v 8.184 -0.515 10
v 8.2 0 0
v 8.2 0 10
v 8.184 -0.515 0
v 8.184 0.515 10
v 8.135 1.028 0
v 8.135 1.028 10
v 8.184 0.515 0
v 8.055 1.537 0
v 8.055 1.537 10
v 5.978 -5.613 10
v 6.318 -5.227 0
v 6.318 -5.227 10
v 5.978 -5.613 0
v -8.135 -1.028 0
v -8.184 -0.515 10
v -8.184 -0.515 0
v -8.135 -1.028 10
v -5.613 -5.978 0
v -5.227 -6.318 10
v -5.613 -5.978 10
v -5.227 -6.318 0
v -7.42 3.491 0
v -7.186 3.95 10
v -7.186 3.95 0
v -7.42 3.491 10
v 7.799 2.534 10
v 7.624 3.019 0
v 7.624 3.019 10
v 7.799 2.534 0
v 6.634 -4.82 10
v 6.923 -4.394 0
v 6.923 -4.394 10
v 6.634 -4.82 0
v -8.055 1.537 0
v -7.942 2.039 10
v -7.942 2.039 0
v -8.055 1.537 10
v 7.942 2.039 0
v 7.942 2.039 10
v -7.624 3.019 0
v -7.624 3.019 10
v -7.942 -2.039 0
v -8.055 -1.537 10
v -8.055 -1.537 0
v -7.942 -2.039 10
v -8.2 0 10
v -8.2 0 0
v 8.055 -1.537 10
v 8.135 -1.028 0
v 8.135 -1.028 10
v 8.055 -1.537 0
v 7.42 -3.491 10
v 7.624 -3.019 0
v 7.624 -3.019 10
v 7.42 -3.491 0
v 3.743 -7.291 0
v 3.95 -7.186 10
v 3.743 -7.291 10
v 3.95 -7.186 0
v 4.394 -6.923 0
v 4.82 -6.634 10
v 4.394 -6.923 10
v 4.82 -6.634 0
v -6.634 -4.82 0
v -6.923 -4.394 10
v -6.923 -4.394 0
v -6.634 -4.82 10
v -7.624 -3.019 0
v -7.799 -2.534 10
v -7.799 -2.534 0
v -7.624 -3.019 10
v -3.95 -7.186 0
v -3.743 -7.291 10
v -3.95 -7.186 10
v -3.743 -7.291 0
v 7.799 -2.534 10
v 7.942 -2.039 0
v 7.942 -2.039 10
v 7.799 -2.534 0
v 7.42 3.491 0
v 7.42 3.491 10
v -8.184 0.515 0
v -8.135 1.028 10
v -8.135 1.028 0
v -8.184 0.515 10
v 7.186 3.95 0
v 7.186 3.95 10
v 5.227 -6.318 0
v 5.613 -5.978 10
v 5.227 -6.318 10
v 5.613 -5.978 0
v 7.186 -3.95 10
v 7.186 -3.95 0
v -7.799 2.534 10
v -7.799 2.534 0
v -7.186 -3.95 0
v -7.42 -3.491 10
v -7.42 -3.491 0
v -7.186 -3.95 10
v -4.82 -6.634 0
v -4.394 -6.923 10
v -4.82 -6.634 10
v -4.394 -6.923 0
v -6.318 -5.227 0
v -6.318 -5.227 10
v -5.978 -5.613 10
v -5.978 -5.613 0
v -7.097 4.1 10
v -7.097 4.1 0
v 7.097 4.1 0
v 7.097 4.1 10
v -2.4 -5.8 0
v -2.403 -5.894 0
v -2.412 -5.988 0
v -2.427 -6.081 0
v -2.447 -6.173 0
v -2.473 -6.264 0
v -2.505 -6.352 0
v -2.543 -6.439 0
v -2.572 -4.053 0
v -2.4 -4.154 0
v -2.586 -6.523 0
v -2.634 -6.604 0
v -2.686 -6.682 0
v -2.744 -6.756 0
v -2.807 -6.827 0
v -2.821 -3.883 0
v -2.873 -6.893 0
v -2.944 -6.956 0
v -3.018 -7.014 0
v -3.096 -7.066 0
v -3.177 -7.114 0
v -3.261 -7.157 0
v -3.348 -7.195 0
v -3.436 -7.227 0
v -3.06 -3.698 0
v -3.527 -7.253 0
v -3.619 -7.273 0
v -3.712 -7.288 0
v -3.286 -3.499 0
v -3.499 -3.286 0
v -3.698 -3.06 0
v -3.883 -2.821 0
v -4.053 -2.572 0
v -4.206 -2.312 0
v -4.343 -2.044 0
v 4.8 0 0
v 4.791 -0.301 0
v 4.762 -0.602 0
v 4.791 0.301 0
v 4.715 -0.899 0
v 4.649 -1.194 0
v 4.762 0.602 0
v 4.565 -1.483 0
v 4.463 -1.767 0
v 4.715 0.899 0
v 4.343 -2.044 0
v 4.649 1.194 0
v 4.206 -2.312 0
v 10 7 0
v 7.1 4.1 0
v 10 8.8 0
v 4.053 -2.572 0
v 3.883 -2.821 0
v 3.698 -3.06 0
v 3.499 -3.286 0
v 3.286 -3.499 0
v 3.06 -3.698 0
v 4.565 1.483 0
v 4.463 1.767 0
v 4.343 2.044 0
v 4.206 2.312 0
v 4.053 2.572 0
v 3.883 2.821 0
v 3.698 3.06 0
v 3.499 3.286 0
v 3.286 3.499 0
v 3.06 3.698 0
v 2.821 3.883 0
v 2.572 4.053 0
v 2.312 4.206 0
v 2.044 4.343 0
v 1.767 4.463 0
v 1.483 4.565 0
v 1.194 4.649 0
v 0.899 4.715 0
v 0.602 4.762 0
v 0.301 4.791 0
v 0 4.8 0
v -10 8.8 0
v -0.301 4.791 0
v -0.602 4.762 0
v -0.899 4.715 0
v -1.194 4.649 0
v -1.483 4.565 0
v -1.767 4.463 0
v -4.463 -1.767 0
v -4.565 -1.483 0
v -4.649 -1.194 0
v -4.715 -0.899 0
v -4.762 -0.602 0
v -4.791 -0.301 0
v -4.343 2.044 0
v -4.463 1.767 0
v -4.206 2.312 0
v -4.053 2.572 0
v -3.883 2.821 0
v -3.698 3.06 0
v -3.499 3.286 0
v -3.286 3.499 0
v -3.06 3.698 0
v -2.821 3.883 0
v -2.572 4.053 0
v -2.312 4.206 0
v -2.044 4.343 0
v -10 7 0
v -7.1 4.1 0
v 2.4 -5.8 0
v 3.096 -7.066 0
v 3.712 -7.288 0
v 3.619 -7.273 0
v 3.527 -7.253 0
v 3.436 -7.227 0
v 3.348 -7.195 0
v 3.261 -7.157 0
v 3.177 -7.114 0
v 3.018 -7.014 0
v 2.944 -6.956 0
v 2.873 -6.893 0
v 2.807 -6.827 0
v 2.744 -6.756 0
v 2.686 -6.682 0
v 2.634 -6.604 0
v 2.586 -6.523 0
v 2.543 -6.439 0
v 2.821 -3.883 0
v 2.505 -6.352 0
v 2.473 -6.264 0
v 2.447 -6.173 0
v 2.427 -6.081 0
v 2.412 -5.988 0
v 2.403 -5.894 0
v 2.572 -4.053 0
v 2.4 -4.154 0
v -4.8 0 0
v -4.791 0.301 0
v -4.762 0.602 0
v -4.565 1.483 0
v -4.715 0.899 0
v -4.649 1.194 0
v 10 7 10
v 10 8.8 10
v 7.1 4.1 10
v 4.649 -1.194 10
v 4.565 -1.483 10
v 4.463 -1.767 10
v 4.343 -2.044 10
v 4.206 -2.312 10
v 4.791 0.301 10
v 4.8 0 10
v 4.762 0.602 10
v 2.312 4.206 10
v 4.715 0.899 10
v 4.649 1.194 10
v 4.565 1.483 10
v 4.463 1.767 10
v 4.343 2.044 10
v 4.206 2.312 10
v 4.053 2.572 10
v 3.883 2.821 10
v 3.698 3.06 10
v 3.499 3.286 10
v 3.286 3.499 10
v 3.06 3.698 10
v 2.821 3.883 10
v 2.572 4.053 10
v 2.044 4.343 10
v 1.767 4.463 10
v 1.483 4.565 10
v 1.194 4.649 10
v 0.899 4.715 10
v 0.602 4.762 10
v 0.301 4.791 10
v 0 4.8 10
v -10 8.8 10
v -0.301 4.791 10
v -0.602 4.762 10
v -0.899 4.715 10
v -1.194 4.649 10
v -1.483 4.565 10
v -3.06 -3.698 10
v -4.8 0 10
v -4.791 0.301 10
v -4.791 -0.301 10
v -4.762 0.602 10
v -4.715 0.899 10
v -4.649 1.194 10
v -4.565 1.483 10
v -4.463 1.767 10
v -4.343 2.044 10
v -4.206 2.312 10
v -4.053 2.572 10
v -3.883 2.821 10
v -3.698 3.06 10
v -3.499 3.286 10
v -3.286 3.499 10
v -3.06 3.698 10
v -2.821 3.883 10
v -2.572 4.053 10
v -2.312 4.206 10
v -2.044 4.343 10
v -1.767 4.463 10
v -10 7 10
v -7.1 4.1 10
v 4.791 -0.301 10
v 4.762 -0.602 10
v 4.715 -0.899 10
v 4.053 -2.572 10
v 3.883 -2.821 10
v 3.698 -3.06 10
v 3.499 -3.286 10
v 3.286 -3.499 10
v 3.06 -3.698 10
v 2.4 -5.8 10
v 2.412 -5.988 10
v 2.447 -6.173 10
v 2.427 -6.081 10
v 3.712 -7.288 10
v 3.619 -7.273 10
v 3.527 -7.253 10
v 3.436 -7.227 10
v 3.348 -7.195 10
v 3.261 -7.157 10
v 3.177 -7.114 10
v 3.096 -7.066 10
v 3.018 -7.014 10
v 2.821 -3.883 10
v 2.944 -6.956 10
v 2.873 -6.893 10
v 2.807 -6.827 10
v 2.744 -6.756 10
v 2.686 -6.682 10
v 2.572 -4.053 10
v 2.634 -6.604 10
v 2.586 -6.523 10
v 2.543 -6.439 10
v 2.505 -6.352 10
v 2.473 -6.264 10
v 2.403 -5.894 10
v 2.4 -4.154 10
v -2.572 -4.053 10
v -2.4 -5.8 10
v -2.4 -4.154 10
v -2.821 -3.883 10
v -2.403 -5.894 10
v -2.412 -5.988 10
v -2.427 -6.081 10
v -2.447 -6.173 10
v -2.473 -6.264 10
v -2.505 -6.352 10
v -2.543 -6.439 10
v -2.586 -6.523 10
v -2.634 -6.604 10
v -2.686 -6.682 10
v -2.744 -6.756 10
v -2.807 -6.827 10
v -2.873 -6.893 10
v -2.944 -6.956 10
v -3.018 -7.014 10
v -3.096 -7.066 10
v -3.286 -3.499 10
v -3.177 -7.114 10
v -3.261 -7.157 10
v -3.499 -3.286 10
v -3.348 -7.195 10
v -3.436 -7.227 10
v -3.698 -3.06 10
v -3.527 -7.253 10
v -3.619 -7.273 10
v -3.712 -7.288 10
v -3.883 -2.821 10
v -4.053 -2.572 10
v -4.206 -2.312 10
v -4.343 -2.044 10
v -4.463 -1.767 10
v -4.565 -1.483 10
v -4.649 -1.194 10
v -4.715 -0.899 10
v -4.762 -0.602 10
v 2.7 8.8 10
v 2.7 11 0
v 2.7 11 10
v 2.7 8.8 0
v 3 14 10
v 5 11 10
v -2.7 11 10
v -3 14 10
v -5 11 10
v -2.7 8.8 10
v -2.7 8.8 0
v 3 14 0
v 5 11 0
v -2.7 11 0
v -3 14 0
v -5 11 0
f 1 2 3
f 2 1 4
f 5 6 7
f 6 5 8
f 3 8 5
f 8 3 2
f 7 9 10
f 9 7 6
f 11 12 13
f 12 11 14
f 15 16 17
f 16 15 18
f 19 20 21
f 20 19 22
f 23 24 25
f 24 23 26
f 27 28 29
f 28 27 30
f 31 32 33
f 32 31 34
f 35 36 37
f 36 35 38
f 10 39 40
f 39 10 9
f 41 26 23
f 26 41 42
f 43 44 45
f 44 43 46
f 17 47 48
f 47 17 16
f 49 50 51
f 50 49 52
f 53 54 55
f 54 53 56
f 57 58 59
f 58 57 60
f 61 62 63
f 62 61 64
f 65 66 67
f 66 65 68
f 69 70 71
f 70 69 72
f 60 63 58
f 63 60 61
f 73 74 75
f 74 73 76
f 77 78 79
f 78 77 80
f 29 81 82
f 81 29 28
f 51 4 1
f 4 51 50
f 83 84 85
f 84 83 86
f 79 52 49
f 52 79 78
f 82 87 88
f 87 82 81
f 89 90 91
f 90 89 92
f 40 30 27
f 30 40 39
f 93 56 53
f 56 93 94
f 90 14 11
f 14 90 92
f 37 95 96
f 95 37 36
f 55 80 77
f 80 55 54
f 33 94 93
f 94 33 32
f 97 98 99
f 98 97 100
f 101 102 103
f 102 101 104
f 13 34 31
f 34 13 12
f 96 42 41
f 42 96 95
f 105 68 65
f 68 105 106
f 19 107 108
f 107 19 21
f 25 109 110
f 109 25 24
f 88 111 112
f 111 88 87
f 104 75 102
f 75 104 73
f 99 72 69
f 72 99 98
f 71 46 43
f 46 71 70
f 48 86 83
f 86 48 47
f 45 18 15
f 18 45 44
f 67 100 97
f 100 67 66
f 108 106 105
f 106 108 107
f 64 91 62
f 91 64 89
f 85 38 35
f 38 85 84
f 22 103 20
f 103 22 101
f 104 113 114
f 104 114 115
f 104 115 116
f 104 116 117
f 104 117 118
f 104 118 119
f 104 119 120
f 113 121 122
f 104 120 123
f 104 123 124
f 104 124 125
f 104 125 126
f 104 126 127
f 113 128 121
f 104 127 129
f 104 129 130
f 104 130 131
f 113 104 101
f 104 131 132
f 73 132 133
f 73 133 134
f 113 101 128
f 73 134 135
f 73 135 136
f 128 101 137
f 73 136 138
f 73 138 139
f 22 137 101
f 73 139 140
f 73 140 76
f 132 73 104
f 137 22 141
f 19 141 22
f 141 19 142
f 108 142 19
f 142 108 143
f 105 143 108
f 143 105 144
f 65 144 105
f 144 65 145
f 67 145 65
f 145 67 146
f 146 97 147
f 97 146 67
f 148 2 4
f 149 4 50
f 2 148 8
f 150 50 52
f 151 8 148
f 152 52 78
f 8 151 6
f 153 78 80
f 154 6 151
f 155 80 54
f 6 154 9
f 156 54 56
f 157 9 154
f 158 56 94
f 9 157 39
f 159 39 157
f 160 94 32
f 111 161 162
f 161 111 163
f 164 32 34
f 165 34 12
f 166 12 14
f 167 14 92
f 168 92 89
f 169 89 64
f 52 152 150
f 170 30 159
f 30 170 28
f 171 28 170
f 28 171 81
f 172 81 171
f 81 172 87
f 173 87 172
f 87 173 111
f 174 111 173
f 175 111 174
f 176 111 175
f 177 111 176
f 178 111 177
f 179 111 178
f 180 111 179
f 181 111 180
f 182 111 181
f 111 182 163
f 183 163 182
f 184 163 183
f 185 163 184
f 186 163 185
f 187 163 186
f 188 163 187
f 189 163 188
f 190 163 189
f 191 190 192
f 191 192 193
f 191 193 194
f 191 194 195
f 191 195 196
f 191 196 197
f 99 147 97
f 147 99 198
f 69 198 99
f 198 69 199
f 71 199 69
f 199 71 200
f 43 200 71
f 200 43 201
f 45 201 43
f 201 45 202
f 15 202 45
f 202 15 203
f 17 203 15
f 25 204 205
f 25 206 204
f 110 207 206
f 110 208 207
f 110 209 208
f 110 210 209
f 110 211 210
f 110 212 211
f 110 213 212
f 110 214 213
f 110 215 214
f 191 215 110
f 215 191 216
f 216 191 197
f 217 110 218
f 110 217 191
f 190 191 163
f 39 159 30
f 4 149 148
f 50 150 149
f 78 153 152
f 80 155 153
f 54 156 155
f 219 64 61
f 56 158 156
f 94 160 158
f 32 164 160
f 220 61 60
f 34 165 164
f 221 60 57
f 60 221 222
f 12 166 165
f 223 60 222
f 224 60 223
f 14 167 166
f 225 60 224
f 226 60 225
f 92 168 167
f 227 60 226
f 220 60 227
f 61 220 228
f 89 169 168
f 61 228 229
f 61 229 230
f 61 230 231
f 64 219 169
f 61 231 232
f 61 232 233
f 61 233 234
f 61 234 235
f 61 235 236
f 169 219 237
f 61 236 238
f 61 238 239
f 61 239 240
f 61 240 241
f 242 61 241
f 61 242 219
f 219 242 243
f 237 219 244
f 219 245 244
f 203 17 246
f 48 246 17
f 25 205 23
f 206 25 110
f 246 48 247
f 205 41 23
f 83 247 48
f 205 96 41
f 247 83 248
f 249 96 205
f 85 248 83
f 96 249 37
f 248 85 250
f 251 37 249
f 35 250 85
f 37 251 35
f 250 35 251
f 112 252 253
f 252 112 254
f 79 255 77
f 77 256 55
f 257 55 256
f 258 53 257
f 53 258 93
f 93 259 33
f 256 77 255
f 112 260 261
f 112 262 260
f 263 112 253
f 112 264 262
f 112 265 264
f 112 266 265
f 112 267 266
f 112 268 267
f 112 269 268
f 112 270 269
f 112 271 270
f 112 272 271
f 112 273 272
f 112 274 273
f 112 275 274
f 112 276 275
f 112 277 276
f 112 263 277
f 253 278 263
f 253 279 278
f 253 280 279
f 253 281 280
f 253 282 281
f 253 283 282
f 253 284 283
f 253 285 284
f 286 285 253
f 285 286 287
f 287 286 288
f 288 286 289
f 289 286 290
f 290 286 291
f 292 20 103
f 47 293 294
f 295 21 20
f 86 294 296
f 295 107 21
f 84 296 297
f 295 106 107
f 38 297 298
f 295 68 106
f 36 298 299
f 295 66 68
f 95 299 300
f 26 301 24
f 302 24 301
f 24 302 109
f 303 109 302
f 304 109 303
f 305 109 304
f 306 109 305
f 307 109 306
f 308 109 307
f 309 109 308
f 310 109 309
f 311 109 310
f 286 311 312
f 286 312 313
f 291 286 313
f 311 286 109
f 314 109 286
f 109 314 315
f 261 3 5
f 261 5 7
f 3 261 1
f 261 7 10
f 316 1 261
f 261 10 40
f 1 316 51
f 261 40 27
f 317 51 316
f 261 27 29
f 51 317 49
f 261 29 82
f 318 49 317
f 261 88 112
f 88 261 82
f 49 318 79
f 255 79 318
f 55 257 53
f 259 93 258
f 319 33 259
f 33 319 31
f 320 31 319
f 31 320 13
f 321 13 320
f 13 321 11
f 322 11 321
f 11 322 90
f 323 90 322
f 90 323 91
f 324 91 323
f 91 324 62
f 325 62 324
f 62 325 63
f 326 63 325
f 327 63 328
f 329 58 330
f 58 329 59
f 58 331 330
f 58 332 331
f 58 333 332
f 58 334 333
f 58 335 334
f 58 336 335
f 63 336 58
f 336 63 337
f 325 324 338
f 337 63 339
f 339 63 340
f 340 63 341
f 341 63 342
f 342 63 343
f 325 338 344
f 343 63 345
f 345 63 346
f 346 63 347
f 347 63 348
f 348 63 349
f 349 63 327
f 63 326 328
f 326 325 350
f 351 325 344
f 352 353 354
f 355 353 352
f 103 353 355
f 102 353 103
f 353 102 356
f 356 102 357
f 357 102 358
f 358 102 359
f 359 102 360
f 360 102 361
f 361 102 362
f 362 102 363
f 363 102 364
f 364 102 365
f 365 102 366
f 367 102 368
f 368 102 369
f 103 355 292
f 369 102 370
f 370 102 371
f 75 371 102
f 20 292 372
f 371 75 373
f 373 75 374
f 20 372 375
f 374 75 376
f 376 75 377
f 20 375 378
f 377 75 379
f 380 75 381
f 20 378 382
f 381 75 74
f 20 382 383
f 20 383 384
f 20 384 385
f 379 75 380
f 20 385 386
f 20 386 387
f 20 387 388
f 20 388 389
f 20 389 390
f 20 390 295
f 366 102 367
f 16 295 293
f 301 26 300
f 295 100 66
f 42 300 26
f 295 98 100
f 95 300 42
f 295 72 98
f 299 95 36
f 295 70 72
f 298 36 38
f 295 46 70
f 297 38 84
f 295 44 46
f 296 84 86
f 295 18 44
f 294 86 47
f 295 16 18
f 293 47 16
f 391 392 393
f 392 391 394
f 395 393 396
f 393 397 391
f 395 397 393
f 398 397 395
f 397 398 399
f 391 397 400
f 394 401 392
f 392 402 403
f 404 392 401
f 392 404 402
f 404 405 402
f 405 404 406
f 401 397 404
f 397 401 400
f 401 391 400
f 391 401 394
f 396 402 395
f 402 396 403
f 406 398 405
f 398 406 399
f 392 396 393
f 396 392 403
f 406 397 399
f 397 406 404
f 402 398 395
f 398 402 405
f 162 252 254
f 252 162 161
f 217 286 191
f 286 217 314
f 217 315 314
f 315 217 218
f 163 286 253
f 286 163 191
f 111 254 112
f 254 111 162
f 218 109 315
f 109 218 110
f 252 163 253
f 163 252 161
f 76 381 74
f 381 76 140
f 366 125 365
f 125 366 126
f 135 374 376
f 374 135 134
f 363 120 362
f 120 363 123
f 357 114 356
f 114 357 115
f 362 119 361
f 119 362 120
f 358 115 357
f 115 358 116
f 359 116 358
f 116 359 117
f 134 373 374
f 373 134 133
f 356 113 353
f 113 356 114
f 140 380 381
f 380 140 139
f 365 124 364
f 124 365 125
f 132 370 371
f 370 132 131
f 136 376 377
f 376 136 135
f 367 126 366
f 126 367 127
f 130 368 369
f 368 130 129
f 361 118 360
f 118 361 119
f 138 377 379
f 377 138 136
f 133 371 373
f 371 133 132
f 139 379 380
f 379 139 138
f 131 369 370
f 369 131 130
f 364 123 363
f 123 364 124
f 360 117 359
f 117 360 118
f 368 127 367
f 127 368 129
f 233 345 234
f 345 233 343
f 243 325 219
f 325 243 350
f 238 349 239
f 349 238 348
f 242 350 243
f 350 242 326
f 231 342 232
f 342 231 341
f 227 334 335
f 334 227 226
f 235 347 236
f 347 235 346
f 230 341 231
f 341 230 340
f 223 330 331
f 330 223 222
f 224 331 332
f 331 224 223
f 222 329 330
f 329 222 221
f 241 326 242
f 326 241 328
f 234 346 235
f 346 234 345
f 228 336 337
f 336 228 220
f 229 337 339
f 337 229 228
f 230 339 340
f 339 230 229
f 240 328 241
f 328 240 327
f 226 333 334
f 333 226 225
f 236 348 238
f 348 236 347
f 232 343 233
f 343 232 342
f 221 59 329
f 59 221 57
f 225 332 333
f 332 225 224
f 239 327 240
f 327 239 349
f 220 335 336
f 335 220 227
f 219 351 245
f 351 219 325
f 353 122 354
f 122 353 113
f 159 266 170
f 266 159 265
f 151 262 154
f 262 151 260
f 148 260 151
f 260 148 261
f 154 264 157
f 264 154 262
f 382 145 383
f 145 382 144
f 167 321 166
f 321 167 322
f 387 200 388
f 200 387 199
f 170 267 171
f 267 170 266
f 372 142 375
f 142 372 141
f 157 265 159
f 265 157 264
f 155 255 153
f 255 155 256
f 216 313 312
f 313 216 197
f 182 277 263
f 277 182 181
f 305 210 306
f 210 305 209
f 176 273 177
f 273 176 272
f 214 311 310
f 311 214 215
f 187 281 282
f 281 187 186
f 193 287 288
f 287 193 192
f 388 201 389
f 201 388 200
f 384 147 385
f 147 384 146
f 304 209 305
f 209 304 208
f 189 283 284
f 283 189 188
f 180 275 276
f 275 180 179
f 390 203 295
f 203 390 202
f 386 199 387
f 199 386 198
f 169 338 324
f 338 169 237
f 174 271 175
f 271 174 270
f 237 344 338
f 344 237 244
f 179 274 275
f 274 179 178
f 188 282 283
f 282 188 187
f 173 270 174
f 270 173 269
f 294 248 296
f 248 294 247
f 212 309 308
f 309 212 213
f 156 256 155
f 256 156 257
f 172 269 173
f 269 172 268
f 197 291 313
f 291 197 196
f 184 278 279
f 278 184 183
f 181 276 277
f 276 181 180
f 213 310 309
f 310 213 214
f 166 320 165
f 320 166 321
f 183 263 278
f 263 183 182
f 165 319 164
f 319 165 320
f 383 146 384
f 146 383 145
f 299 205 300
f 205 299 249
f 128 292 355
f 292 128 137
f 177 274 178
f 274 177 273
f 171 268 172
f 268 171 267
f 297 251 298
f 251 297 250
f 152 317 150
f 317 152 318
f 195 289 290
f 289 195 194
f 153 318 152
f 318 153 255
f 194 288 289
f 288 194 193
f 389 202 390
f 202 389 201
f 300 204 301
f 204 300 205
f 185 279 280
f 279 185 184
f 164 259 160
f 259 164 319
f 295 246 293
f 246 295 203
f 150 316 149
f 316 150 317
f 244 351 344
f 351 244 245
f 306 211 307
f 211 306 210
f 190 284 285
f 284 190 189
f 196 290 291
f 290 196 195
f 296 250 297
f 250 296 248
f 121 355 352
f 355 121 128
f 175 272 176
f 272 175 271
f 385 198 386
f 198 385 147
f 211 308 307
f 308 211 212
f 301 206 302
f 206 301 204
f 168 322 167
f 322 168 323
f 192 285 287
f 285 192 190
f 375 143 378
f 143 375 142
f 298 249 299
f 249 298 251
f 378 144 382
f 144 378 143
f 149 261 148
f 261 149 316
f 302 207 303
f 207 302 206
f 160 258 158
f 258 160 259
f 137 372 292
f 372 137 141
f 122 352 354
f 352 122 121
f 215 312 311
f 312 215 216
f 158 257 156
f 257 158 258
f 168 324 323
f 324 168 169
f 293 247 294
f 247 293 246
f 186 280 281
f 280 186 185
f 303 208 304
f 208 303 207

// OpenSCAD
// file: functions.scad
/**********************************
	File: functions.scad
	Revision: 0.2 (2/3/2012)
	OpenSCAD version by:
	Michael Williams (gannon)
	mswillia@mtu.edu
**********************************/
include <config.scad>

//Drill a hole the given depth at the given location
module drill(x,y,radius,depth) {
	translate([x,y,-overdrill])
		cylinder(r=radius,h=depth,$fn=100);
}

module roundedcorner(radius,thickness,angle) {
	rotate([0,0,angle])
		translate([-radius+overdrill,-radius+overdrill,-overdrill])
			difference() {
				translate([-overdrill,-overdrill,0])
					cube([radius+overdrill,radius+overdrill,thickness+overdrill*2]);
				cylinder(r=radius,h=thickness+overdrill*2, $fn=100);
			}
}

module Lbracket(height,width,length,thickness) {
	difference() {
		cube([height+thickness,width+thickness,length]);
		translate([thickness,thickness,-overdrill])
			cube([width+thickness,height+thickness,length+overdrill*2]);
	}
}

//Usage: points is an array consisting of elements
//[x,y,r] for each point of the polygon
//Please note that x and y will be the centers
//of the rounded edges! Outside wall will be
//r away at some angle.
//Ideally I will make a function that will find
//the place to put the circle of a given radius
//based off of the points in the polygon.
module multiradiusroundedpoly(points,height) {
	linear_extrude(height=height)
		hull()
			for (p = points) {
				translate([p[0],p[1],0])
					circle(r=p[2],$fn=100);
			}
}

module bearing_block_holes() {
	make_4_holes(bearing_block_base[0]-11, bearing_block_base[1]-9, bearing_block_base[2],screw_b_diameter/2);
}

module make_4_holes(width,height,depth,radius) {
	translate([width/2, height/2,0])
		for (i=[-1,1],j=[-1,1]) {
			translate([i*width/2, j*height/2, 0])
				drill(0,0, radius, depth+overdrill*2);
		}
}

module x_axis_bearing_mount() {
	difference() {
		cube(bearing_mount_base);
		
		//Rounded corners
		for (i=[0,1],j=[0,1]) {
			translate([i*bearing_mount_base[0],j*bearing_mount_base[1],0])
				if (i==1 && j==1)
					roundedcorner(bearing_mount_corner,bearing_mount_base[2],0);
				else
					roundedcorner(bearing_mount_corner,bearing_mount_base[2],180+i*90-j*90);
		}
		

		//Middle cutout
		translate([(bearing_mount_base[0]-bearing_mount_hole[0])/2,(bearing_mount_base[1]-bearing_mount_hole[1])/2,-overdrill])
			cube(bearing_mount_hole);
			
		//Bearing mounts
		translate([bearing_mount_base[0]-bearing_block_base[0]+10.5+screw_b_diameter/2,bearing_block_base[0]-4.5+screw_b_diameter/2,0])
			rotate([0,0,-90])
				bearing_block_holes();

		translate([6,bearing_block_base[0]-4.5+screw_b_diameter/2,0])
			rotate([0,0,-90])
				bearing_block_holes();
		
		//Middle 4 holes
		translate([44.5,4,0])
			make_4_holes(bearing_mount_base[0]-89,bearing_mount_base[1]-8,bearing_mount_base[2],screw_b_diameter/2);

	}
}
// file: config.scad
/**********************************
	File: config.scad
	Revision: 0.3 (2/3/2013)
	OpenSCAD version by:
	Michael Williams (gannon)
	mswillia@mtu.edu
**********************************/

/**********************************
	GENERAL CONFIGURATION
**********************************/
//This is for the depth of holes so OpenSCAD renders correctly.
overdrill=0.1;

//LM10UU
linear_bearing_length=29;
linear_bearing_ID=10;
linear_bearing_OD=19.4;//19

//HFSB5-2020 extrusions
extrusion_height=20;
extrusion_width=20;
extrusion_wall=3.2;
extrusion_opening=5.4;

//Large rods
smooth_rod_diameter=10;
threaded_rod_diameter=8;

//608zz
skate_bearings_length=7;
skate_bearings_ID=8;
skate_bearings_OD=22;

//Belt configuration
belt_width=8;
belt_depth=1;

/*
3/8"-12 acme rod
m8 threaded rod
*/

spring_OD=6;

screw_a_diameter=3;
screw_b_diameter=4;
screw_c_diameter=5;
screw_d_diameter=8;

/**********************************
	AUTO CONFIGURATION
**********************************/

//Bearing block
bearing_block_base = [linear_bearing_OD*2+5,linear_bearing_length+5,7];

//X Axis
bearing_mount_corner = 6;
bearing_mount_base = [114,bearing_block_base[0]+3.7,6];
bearing_mount_hole = [bearing_mount_base[0]-12,bearing_mount_base[1]-27.5,bearing_mount_base[2]+overdrill*2];

/**********************************
	END CONFIGURATION
**********************************/
// main file
/**********************************
	File: CableHolder.scad
	Revision: 0.4 (2/2/2013)
	OpenSCAD version by:
	Michael Williams (gannon)
	mswillia@mtu.edu
**********************************/
include <config.scad>
use <functions.scad>
/**********************************
		CONFIGURATION
**********************************/
//Base size
thickness=10;
wall_thickness=3.4;
radius=4.8;
opening=4.8;

ratio = (extrusion_width/20);

/**********************************
		END CONFIGURATION
**********************************/

difference() {
	//Make our base unit
	union() {
		cylinder(r=radius+wall_thickness,h=thickness,$fn=100);
		translate([-2.7*ratio,radius+(4),0])
			cube([extrusion_opening,extrusion_wall,thickness]);
		translate([0,radius+extrusion_wall+3,0])
			linear_extrude(height=thickness)
				polygon(points=[[-extrusion_width/4,0],[-(extrusion_width/2)*0.3,3],[(extrusion_width/2)*0.3,3],[extrusion_width/4,0]]);
		translate([0,radius-(0.7),0])
			linear_extrude(height=thickness)
				polygon(points=[[-7.1,0],[-extrusion_width/2,2.9],[-extrusion_width/2,4.7],[extrusion_width/2,4.7],[extrusion_width/2,2.9],[7.1,0]]);
	
	}

	//Drill the hole
	drill(0,0,radius,thickness+overdrill*2);

	//This is actually slightly trapezoidal in the sketchup
	//4.8mm inside and 5.0mm outside...leaving it square for now
	translate([-opening/2,-(radius+wall_thickness+overdrill),-overdrill])
		union() {
			cube([opening,radius+wall_thickness+overdrill,thickness+overdrill*2]);

			translate([-1.5,2.5,-overdrill]) difference() {
				translate([0,-3,overdrill])
					cube([3,3,thickness+overdrill*2]);
				cylinder(r=1.5,h=thickness+overdrill*4,$fn=100);
			}
			translate([opening+1.5,2.5,-overdrill]) difference() {
				translate([-3,-3,overdrill])
					cube([3,3,thickness+overdrill*2]);
				cylinder(r=1.5,h=thickness+overdrill*4,$fn=100);
			}
		}
}
